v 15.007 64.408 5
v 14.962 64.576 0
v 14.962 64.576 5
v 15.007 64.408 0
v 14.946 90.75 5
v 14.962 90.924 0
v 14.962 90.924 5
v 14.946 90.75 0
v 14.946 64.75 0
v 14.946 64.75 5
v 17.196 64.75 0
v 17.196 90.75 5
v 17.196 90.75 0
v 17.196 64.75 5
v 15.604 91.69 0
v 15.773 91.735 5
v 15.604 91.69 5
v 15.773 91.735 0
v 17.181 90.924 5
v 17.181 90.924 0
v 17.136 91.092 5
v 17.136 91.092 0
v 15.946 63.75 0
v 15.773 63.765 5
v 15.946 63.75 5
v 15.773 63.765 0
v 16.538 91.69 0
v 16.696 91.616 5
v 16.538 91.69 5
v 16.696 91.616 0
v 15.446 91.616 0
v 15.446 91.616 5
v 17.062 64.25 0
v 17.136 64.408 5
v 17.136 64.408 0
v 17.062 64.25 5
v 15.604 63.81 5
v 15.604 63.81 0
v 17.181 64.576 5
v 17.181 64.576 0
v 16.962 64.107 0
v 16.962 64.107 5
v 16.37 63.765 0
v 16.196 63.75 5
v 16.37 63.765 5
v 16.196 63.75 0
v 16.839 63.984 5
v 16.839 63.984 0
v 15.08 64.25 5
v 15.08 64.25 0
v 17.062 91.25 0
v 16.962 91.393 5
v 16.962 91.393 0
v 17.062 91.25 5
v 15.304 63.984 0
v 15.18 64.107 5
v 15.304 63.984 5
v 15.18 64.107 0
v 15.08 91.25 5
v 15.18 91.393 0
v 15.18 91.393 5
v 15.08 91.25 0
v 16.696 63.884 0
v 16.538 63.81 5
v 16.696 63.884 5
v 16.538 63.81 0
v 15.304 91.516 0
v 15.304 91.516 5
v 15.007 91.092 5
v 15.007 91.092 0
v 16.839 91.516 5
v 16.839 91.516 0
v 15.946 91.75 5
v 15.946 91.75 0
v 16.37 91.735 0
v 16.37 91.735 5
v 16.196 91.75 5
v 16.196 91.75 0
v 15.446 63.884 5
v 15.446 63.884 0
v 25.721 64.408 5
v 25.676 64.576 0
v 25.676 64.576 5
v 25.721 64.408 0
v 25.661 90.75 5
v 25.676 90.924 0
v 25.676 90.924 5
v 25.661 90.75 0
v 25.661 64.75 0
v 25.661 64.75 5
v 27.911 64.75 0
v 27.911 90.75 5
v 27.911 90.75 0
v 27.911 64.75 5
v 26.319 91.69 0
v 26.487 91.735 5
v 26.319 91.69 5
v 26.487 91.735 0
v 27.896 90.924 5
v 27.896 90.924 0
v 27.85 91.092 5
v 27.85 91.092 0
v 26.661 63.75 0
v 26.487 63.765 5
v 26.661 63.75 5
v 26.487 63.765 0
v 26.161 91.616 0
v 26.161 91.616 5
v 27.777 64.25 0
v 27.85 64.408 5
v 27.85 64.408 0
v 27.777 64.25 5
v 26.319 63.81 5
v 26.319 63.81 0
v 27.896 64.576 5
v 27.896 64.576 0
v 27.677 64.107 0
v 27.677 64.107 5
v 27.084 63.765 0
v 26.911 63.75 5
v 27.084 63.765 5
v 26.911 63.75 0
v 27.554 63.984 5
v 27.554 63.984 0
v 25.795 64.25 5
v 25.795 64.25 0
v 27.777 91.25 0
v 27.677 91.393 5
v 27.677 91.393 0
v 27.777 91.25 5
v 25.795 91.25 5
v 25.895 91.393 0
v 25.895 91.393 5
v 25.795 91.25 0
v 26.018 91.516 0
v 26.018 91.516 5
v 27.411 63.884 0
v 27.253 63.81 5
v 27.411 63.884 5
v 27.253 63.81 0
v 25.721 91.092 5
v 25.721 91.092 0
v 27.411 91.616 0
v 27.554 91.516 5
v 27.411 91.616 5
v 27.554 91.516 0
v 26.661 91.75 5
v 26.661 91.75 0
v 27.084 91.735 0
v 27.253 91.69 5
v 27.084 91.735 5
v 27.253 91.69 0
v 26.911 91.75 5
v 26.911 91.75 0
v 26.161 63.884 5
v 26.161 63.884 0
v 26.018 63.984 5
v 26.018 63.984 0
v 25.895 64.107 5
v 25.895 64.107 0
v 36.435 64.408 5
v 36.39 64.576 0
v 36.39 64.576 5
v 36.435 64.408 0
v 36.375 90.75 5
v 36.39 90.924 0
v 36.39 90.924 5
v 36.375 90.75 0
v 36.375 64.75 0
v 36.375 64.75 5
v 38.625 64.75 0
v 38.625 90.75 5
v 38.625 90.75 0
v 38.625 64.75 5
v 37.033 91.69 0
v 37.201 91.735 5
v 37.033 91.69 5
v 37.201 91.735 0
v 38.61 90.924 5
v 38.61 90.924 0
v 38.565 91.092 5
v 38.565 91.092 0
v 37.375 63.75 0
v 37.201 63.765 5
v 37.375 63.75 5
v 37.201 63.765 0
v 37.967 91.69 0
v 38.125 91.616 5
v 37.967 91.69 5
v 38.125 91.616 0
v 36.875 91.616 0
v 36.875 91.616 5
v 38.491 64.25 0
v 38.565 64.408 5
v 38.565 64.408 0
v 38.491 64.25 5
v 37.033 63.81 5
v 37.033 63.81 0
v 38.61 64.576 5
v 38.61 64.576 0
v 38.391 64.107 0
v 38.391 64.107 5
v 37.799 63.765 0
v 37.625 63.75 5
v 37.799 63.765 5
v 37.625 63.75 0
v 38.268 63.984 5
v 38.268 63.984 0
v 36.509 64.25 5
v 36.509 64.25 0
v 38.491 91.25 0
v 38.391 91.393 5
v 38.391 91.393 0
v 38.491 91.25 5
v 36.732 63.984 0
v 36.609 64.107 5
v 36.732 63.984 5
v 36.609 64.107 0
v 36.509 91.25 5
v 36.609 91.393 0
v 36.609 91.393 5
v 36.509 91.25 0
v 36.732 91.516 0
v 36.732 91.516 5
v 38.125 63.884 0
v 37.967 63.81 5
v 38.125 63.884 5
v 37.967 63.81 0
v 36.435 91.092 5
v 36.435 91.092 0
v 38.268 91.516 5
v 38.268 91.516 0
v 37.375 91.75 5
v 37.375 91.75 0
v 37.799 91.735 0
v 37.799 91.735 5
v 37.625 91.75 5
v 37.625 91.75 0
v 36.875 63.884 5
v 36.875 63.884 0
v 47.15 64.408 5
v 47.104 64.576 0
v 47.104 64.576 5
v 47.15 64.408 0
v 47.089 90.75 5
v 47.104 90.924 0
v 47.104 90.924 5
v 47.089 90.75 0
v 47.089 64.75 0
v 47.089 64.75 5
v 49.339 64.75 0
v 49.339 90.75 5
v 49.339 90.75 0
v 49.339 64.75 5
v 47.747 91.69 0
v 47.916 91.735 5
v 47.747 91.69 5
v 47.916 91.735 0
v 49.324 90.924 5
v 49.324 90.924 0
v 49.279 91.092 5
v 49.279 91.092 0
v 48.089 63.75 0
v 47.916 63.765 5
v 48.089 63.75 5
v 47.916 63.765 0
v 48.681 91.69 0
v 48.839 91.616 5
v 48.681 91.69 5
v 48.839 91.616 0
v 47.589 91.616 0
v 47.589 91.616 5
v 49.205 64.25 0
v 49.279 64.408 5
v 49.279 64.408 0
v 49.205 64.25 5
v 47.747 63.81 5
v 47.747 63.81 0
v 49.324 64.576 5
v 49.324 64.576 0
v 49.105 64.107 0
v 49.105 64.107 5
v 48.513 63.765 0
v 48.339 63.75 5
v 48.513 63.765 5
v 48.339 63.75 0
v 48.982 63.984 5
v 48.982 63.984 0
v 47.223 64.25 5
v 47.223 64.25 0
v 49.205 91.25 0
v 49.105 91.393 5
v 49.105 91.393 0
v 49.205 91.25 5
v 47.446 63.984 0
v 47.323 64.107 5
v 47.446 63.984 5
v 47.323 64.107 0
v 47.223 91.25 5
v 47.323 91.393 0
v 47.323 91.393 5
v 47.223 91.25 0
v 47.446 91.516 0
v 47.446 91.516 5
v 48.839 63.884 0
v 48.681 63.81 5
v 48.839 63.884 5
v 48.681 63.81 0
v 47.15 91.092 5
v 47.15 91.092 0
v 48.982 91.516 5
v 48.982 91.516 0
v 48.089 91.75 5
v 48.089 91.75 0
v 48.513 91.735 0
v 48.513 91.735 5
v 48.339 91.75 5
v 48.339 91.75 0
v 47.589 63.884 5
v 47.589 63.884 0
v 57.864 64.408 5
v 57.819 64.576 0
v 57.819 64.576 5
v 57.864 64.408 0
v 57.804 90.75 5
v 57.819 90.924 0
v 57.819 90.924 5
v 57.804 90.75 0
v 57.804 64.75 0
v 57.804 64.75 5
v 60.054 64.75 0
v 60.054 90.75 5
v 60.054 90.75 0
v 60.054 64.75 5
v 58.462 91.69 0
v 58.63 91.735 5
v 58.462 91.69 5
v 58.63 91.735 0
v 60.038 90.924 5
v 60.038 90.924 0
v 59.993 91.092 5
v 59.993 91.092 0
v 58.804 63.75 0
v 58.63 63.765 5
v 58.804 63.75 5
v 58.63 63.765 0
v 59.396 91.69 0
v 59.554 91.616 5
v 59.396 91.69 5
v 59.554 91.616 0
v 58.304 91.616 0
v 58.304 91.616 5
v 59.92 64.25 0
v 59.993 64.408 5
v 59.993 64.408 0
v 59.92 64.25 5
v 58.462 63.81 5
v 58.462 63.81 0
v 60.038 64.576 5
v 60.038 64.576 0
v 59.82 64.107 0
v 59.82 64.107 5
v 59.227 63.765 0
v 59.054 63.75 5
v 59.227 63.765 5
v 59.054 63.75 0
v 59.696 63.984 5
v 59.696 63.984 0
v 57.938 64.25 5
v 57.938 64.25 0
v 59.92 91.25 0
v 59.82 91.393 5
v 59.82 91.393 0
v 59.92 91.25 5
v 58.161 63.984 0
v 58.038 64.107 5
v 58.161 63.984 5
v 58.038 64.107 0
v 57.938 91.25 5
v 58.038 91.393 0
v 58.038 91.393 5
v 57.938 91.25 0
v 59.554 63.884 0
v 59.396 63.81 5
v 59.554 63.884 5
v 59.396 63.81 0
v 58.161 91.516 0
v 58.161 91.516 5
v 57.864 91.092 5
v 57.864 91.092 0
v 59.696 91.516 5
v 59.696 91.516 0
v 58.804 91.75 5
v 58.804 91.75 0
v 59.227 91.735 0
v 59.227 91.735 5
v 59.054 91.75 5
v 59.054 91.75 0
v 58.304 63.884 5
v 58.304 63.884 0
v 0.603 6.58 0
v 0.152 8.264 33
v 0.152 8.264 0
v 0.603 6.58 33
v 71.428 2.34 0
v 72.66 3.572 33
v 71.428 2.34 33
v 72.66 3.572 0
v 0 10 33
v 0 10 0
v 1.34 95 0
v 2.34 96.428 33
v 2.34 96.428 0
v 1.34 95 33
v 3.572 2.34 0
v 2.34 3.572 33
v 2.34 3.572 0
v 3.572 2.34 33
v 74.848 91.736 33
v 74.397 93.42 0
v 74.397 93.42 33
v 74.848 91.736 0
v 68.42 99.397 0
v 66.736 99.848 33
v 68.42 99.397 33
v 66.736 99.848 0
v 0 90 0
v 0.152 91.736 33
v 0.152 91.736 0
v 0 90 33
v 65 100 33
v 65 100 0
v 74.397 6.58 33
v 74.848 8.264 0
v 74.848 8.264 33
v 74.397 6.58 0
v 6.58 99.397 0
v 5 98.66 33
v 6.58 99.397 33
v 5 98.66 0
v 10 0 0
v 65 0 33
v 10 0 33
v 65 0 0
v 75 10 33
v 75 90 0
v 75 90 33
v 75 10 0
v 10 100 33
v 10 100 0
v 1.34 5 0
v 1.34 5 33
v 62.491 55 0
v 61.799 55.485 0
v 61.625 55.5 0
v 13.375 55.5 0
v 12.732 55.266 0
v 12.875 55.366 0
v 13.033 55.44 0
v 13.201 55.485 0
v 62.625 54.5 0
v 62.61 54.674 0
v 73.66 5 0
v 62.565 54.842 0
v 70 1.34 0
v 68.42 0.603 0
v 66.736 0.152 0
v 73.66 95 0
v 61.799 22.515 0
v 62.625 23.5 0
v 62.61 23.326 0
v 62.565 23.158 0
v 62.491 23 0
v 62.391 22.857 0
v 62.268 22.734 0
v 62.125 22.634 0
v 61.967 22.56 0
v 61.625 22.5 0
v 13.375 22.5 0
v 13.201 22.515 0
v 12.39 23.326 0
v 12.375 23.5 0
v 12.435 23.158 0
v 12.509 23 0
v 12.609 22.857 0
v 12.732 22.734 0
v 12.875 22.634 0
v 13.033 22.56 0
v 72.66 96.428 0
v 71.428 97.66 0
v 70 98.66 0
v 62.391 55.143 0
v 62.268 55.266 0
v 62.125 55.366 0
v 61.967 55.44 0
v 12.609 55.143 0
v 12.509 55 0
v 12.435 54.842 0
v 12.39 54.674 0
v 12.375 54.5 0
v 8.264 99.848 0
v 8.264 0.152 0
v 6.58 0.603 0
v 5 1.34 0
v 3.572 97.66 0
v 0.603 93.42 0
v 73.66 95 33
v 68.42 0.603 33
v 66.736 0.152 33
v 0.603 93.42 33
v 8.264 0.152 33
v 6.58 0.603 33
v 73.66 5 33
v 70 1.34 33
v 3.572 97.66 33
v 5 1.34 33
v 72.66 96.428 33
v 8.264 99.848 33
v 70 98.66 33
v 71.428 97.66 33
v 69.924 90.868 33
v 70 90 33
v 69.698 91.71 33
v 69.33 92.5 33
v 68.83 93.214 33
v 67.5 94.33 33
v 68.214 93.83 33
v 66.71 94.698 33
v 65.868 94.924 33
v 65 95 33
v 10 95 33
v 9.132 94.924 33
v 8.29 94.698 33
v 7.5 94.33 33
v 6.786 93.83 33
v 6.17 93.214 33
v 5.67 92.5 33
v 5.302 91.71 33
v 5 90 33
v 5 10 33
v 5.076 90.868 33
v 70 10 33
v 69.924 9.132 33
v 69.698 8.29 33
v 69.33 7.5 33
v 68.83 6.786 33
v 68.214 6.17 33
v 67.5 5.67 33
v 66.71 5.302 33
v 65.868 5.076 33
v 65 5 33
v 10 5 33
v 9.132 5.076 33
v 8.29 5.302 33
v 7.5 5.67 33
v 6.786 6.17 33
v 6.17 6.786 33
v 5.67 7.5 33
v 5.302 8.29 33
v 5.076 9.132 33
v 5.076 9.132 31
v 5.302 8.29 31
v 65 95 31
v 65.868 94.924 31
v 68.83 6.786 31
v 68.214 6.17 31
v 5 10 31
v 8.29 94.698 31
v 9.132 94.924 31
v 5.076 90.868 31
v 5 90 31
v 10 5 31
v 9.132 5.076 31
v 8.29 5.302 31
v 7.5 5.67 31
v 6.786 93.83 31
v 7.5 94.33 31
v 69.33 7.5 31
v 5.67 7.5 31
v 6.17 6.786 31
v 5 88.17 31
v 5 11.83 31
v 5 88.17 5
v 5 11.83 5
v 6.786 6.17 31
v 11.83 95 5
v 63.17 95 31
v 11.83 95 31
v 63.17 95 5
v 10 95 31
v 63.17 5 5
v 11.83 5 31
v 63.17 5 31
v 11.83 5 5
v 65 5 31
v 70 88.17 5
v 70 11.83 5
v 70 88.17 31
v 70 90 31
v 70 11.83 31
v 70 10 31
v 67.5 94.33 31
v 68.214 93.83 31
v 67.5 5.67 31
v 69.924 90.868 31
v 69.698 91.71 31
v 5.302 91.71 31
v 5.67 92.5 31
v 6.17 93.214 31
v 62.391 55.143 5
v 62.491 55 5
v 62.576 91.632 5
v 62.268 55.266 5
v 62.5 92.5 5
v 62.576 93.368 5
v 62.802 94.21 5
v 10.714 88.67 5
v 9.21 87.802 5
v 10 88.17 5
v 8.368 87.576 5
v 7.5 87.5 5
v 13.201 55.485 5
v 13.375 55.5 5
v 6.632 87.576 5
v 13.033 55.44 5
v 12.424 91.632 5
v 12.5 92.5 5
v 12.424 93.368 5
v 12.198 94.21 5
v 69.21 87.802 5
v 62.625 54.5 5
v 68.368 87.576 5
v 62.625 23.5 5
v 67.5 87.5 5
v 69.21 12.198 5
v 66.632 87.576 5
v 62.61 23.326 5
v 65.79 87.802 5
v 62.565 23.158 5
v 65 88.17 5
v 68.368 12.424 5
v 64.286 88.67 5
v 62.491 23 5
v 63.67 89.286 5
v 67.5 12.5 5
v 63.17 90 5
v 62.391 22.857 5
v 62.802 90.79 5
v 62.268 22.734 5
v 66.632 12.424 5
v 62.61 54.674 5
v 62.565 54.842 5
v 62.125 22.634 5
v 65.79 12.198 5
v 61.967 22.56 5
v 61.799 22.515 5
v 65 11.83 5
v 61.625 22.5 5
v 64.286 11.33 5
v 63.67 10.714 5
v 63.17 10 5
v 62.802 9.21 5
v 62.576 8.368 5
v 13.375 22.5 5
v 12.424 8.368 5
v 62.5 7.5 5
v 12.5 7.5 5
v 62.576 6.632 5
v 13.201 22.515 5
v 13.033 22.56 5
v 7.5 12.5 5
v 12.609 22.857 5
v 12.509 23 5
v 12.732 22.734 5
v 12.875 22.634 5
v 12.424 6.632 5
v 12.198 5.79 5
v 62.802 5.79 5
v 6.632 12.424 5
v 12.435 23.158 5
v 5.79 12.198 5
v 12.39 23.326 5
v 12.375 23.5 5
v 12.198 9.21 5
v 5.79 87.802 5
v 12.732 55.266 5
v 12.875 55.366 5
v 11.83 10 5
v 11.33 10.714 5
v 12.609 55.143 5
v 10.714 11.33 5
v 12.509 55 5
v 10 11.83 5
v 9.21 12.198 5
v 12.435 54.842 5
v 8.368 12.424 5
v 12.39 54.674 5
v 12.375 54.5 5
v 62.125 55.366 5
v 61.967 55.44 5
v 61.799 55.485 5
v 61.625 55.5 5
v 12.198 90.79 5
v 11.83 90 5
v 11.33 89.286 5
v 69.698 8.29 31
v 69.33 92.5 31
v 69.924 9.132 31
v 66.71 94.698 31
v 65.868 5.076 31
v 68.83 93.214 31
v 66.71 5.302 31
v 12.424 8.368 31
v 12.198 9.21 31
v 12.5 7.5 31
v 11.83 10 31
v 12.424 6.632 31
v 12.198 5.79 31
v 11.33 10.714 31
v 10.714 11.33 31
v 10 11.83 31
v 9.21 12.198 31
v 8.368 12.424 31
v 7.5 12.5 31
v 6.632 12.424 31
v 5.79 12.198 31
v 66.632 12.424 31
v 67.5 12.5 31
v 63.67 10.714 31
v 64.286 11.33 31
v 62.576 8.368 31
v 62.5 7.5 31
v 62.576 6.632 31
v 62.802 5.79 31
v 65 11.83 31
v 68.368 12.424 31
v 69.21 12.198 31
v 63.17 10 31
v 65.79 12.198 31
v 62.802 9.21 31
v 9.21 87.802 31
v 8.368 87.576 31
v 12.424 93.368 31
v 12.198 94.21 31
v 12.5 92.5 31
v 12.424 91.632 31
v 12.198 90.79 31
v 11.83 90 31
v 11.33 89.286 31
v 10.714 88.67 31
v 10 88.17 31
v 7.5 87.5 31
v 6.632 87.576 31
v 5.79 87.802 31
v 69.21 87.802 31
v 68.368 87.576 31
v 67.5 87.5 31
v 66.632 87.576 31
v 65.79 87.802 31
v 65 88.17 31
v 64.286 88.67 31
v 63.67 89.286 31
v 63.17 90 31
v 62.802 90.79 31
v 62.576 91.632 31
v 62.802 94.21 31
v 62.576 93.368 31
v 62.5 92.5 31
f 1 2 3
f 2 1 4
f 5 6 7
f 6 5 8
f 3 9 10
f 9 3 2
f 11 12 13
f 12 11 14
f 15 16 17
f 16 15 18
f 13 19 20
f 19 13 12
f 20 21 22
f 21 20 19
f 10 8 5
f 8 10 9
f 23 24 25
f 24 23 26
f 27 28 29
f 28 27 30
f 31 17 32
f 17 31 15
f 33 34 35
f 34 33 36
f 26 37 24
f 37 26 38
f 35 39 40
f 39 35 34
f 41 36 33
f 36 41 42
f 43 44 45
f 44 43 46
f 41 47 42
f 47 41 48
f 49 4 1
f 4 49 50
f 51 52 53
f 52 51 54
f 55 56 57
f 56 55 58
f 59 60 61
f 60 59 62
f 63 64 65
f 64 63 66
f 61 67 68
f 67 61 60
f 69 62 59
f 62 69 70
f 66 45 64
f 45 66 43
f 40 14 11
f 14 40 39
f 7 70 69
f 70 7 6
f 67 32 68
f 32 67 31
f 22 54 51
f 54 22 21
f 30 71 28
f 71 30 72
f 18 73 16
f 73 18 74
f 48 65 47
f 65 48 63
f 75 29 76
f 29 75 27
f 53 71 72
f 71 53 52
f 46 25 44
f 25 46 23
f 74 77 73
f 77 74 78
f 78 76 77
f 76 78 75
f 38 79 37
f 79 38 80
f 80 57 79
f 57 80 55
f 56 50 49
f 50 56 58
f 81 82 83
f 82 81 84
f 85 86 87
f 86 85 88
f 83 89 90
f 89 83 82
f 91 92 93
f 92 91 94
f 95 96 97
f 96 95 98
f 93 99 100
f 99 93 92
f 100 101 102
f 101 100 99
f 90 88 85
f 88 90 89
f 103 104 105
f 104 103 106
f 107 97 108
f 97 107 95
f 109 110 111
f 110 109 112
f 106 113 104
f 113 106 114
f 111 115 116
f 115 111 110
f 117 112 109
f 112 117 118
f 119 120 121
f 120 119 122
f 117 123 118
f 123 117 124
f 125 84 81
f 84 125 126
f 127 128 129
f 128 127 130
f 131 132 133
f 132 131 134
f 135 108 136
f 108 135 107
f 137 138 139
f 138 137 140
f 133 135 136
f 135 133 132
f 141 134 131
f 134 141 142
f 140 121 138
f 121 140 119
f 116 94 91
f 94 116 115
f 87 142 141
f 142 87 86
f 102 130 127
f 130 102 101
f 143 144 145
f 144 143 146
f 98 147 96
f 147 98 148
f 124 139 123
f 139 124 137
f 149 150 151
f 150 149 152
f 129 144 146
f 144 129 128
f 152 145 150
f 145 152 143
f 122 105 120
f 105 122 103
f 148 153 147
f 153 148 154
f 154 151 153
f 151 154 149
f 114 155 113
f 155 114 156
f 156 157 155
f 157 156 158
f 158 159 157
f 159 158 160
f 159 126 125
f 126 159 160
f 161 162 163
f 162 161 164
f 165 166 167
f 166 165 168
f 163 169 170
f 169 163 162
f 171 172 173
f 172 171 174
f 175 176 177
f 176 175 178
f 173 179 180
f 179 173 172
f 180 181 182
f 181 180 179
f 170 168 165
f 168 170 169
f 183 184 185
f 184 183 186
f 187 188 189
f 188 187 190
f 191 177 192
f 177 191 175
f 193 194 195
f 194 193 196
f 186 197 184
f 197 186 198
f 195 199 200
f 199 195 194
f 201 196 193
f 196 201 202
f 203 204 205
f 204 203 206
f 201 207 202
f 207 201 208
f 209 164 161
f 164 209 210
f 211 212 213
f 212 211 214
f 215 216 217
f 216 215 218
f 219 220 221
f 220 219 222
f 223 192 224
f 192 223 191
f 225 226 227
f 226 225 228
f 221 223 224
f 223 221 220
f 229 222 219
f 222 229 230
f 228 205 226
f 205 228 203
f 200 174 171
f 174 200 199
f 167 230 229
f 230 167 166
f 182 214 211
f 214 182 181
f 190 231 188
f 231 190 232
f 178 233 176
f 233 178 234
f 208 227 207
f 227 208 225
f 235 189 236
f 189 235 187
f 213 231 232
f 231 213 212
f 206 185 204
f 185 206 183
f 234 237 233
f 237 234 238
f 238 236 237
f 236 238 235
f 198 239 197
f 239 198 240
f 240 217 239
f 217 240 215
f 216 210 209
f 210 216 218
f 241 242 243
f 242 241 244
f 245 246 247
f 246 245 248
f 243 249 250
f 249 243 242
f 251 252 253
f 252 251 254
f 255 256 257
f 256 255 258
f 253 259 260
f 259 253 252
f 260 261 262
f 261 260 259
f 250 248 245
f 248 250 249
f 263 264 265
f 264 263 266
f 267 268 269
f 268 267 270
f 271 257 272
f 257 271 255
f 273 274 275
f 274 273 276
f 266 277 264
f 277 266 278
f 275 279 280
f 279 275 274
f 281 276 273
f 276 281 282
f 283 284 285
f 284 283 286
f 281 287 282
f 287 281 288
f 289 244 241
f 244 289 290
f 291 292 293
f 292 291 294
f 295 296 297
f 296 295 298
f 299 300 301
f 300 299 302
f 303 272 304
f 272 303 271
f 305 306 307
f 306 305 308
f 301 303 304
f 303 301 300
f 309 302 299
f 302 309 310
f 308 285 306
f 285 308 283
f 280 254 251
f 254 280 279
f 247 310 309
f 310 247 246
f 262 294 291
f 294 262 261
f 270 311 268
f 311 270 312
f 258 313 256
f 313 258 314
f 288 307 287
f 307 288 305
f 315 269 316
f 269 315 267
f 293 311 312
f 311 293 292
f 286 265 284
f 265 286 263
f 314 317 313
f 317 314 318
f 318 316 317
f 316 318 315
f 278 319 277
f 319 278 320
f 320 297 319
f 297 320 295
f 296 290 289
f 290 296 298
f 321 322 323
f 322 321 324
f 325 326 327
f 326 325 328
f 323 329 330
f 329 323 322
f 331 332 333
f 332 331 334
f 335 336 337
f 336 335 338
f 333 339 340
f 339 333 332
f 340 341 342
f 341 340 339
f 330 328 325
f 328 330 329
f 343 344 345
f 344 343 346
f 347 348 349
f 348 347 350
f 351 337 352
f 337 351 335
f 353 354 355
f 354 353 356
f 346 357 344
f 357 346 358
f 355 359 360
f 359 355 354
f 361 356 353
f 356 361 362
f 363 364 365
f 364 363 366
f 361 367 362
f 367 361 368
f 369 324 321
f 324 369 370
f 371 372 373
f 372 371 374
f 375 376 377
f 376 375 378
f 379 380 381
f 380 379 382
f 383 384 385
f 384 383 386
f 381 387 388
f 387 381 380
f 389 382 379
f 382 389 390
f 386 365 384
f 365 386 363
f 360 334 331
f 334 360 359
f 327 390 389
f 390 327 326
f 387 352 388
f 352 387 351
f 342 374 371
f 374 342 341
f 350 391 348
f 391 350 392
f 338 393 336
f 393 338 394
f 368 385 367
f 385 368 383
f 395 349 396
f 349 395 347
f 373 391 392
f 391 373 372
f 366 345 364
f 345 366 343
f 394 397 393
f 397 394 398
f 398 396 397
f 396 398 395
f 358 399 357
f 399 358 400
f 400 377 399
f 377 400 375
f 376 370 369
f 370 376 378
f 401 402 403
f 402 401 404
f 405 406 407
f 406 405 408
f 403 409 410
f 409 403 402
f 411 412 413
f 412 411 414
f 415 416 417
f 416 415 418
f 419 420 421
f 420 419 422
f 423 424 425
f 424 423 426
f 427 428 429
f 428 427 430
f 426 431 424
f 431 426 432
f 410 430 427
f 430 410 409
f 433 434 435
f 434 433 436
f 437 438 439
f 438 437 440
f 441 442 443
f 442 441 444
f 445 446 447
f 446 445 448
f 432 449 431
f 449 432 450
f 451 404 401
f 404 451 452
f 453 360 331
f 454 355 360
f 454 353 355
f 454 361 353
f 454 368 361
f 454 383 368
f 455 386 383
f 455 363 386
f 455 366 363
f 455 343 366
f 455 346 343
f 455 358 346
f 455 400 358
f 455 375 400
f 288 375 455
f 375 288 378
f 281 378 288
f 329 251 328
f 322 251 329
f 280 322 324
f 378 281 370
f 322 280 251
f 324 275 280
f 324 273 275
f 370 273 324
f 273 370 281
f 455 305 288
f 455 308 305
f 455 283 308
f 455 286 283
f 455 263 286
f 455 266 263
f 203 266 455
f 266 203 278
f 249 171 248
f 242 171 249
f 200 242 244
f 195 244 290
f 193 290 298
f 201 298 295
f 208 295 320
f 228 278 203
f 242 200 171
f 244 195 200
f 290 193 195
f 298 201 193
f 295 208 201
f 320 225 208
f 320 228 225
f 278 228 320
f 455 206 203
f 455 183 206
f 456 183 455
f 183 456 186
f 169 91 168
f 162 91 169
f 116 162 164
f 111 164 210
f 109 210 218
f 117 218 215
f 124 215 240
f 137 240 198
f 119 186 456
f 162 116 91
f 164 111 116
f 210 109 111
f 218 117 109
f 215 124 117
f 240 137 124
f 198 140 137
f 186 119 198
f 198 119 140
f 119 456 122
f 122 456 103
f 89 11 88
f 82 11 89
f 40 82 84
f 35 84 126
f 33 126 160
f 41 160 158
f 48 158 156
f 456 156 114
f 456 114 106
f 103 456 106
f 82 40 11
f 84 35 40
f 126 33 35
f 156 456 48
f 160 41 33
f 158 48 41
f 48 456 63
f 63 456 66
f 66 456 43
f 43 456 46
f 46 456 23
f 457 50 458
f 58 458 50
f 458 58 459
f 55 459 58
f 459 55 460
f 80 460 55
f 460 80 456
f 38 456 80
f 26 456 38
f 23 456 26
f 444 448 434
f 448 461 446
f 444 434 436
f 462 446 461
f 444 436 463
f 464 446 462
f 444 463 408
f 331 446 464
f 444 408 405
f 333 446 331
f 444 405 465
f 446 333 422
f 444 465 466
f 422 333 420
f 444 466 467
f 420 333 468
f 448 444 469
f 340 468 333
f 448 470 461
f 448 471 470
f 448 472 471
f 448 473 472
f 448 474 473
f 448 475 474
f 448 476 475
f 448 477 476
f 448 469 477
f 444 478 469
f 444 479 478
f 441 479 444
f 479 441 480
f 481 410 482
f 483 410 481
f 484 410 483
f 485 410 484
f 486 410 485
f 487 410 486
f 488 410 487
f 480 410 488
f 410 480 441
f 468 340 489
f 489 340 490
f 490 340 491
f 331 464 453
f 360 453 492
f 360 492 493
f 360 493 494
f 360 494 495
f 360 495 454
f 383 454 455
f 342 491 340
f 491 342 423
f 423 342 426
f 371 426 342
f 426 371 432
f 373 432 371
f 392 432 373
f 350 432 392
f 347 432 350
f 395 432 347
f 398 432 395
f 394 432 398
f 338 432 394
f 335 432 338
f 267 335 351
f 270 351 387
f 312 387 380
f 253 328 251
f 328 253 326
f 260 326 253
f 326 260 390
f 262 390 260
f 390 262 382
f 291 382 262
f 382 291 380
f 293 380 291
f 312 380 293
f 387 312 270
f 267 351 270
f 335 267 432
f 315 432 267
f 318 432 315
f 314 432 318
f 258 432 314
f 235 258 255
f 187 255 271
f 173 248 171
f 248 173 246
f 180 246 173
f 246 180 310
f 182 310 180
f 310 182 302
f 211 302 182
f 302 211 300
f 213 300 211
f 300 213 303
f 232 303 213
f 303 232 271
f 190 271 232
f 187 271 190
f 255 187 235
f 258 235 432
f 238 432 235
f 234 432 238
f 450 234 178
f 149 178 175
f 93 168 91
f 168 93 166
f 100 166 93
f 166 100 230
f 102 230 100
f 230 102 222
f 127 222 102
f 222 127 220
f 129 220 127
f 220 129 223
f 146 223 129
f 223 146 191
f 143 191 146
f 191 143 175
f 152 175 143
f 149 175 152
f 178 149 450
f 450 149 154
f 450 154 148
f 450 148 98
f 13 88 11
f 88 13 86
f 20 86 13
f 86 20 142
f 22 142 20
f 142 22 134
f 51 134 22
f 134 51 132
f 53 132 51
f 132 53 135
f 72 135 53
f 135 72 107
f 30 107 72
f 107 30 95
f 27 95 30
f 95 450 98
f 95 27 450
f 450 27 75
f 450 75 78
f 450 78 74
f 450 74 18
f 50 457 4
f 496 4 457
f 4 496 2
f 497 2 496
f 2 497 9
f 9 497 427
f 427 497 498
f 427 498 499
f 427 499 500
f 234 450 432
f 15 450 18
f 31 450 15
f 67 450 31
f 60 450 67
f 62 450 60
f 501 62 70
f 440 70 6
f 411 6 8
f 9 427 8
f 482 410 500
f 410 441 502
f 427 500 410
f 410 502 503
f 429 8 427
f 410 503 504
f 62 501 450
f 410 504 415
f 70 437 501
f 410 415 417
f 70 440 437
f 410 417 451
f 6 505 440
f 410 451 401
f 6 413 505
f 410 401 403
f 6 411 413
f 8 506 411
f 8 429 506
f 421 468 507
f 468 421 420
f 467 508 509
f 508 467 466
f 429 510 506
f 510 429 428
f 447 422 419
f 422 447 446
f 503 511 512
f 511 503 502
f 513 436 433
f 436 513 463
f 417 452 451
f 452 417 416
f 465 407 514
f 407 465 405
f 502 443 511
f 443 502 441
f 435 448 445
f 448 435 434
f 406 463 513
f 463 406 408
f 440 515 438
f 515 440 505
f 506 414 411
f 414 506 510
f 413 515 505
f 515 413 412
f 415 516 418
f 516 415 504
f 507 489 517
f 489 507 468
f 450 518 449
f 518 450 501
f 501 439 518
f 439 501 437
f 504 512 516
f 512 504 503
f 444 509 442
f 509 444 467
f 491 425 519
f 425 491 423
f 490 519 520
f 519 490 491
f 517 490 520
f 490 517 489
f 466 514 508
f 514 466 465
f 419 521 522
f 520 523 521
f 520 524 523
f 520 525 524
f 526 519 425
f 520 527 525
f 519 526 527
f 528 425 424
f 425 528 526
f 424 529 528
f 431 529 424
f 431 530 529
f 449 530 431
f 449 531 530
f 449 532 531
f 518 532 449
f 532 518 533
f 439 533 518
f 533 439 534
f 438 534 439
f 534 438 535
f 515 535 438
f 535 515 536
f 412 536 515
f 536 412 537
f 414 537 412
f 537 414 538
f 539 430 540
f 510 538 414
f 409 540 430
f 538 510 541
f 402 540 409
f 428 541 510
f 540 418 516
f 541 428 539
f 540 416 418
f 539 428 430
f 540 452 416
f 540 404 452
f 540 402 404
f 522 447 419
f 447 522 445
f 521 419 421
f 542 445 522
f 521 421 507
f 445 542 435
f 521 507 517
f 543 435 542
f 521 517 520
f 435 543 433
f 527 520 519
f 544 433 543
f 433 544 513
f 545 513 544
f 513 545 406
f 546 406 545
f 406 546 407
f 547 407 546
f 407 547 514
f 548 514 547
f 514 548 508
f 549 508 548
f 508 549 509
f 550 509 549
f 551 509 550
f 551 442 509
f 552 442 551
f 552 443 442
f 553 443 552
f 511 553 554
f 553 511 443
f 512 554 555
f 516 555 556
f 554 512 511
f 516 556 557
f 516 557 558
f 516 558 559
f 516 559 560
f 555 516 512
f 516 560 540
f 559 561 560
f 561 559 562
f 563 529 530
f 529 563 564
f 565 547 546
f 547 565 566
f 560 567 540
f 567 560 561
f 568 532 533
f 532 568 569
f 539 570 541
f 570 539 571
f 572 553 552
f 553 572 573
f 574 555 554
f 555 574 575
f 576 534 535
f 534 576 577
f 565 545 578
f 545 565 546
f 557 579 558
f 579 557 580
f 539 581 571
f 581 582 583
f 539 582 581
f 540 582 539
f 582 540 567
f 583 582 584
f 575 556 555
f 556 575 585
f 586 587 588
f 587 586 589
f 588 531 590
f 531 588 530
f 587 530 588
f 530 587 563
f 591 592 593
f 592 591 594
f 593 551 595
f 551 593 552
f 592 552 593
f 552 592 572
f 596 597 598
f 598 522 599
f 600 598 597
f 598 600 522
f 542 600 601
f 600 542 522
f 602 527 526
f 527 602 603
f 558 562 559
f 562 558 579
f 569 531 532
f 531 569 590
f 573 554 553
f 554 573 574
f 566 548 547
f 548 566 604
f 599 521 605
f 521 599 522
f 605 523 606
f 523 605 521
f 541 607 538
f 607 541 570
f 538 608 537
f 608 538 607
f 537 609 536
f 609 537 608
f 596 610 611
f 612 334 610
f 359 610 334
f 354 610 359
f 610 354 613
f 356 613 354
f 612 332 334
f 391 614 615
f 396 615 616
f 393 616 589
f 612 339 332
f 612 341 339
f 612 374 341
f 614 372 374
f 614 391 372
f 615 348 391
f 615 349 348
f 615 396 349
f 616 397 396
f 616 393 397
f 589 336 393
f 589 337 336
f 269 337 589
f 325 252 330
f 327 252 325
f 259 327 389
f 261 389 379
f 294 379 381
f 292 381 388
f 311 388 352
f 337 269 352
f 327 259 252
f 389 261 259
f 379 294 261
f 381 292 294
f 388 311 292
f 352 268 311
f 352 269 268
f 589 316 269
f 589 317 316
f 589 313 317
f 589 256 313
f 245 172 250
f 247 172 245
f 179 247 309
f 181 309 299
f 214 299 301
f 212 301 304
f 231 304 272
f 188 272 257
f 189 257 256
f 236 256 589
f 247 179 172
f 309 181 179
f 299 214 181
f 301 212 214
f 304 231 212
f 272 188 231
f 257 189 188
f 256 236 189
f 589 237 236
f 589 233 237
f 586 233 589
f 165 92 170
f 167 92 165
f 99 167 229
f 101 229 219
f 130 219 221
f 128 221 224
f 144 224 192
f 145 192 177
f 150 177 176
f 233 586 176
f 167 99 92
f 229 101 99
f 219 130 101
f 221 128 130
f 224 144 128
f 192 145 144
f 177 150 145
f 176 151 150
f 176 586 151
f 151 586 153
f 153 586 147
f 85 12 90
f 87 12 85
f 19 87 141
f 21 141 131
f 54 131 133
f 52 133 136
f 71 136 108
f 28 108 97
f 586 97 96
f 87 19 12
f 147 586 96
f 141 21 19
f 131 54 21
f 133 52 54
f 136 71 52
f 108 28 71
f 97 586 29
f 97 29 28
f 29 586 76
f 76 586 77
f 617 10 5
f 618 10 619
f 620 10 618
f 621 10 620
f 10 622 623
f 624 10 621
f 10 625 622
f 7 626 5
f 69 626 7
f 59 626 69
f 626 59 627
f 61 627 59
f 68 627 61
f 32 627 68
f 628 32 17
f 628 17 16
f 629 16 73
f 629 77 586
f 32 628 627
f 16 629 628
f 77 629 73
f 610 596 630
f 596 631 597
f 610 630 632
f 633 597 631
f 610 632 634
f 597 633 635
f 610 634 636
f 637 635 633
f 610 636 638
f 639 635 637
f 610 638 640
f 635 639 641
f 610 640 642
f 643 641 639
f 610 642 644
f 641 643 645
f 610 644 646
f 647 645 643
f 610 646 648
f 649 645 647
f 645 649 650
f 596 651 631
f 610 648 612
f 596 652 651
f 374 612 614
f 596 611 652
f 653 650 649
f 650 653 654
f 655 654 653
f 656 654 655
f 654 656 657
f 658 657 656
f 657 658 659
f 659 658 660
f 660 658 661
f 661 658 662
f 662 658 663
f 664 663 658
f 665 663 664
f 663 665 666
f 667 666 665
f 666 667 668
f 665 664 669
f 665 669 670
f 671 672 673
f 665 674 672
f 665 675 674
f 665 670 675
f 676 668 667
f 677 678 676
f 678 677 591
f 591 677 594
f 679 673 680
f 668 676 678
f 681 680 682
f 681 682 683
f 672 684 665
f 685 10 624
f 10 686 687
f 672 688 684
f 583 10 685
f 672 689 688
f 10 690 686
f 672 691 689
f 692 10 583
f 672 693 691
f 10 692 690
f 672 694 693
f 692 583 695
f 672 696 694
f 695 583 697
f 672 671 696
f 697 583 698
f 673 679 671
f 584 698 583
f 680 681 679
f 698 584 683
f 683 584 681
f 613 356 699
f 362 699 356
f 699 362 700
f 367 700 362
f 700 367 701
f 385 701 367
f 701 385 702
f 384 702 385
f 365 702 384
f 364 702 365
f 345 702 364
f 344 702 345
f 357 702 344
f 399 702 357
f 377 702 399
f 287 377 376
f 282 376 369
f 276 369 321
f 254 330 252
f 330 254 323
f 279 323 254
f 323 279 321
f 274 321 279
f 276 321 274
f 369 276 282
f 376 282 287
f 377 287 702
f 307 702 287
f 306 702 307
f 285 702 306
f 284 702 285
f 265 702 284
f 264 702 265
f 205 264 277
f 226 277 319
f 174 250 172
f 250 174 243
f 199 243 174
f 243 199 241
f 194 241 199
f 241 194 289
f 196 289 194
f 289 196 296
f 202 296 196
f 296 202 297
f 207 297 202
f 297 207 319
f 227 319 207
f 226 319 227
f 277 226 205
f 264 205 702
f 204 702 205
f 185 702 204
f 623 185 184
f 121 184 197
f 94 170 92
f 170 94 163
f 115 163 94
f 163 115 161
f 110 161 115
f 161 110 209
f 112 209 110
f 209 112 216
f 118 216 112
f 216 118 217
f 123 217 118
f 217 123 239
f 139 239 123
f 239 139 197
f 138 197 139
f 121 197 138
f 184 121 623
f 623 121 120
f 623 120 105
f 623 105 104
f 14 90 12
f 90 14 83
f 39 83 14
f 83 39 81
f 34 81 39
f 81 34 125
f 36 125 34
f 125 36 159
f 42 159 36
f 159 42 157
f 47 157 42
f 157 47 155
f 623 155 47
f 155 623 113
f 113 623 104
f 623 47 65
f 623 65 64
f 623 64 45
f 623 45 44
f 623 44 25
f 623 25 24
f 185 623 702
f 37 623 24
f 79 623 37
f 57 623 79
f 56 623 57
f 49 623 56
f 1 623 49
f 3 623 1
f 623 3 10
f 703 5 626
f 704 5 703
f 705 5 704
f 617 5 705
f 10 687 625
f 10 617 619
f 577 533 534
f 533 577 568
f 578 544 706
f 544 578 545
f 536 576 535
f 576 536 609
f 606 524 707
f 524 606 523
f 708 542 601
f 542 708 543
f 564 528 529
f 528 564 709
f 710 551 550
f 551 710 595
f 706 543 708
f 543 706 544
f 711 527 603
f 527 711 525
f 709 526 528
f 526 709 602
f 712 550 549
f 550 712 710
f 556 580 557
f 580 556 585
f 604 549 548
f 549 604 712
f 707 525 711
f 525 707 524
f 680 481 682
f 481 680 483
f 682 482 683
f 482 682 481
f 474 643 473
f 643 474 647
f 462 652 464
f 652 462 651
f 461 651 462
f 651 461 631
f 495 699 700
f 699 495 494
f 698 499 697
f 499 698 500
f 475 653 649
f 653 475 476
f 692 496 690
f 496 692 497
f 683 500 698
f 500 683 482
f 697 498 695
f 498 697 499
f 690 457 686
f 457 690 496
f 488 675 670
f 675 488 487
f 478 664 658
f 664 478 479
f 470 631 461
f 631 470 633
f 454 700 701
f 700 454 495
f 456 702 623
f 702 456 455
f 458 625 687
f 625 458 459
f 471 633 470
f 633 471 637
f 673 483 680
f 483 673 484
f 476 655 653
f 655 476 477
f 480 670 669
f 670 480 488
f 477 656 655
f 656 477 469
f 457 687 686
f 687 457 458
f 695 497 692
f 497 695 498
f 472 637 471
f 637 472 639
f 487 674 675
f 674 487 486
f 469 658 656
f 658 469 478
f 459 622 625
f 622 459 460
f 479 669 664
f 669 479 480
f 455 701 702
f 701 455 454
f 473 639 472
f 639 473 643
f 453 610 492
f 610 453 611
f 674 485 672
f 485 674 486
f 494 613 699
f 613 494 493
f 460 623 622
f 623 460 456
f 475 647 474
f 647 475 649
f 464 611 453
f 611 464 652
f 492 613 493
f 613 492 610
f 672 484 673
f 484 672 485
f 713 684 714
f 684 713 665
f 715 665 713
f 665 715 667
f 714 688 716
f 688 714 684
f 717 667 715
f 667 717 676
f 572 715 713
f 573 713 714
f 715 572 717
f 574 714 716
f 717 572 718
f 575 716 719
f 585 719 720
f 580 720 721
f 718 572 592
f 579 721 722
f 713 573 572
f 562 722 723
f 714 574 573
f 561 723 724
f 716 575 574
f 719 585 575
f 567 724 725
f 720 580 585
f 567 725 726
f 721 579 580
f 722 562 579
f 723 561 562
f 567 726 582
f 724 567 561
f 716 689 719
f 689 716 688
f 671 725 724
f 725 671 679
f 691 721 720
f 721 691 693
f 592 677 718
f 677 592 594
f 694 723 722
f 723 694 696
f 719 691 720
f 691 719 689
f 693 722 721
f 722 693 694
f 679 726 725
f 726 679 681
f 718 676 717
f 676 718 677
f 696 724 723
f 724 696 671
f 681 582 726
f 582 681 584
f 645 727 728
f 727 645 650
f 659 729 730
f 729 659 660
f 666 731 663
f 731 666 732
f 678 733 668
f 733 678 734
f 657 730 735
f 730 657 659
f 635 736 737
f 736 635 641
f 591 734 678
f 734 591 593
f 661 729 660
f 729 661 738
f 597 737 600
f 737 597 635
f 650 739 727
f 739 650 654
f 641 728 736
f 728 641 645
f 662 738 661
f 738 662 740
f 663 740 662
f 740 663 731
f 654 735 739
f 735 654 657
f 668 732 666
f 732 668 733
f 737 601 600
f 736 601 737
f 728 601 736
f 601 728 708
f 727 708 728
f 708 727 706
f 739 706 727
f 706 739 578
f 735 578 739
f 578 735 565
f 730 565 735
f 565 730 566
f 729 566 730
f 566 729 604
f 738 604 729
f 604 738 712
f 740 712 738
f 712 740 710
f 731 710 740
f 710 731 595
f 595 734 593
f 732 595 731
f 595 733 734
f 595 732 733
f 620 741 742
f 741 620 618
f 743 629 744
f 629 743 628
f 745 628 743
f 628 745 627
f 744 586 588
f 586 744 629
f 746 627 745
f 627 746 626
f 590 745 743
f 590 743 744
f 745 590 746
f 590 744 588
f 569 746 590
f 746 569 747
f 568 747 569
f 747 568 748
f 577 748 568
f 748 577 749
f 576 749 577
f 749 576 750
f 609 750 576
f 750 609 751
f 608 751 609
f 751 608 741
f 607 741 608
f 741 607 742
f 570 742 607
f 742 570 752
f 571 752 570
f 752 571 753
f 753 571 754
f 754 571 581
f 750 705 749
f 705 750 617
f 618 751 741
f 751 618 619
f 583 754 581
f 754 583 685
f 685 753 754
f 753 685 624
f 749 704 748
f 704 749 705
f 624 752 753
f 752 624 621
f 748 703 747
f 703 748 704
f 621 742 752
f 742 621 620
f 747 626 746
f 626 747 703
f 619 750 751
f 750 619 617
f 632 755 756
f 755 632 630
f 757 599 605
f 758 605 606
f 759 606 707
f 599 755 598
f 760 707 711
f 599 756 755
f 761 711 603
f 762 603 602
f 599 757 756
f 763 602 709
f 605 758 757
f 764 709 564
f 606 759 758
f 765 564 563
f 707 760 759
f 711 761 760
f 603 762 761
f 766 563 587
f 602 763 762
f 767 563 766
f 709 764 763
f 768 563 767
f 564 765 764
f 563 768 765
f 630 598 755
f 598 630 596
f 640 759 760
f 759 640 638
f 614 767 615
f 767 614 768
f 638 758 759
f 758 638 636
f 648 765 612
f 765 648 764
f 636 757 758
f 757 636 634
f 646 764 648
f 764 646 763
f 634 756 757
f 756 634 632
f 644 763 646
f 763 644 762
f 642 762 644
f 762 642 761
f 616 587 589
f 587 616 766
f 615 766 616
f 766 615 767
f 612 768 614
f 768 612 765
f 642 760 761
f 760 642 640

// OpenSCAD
/*
ArduBMO / Back
Version: 0.01
TODO:
*/

$fn=36;

outerX = 75;
outerY = 100;
outerZ = 33;
outerR = 10;
wall = 5;

/* MODULES */

module roundedBox(x,y,z,r){
	translate([r,r,0]){
		linear_extrude(height=z){
			hull(){
				circle(r);
				translate([x-(2*r), 0, 0]) circle(r);
				translate([0, y-(2*r), 0]) circle(r);
				translate([x-(2*r), y-(2*r), 0]) circle(r);
			}
		}
	}
}

module backVents(){
	for (i = [0:4]){
		translate([outerX/7*i,0,-1]) roundedBox(0.03*outerX, 0.28*outerY, 2+wall, 0.1*outerR);
	}
}

module batteryHatch(){
	roundedBox(0.67*outerX, 0.33*outerY, 2+wall, 0.1*outerR);
}

module frontSupports(){
	translate([0.75*outerR, 0.75*outerR, 1]) cylinder(outerZ-3, outerR/2, outerR/2);
	translate([outerX-(0.75*outerR), 0.75*outerR, 1]) cylinder(outerZ-3, outerR/2, outerR/2);
	translate([0.75*outerR, outerY-(0.75*outerR), 1]) cylinder(outerZ-3, outerR/2, outerR/2);
	translate([outerX-(0.75*outerR), outerY-(0.75*outerR), 1]) cylinder(outerZ-3, outerR/2, outerR/2);
}

/* CASE BACK */

union(){
	difference(){
		/* solid block */
		roundedBox(outerX,outerY,outerZ,outerR);
	
		/* hollow */
		translate([wall,wall,wall]){ 
			roundedBox(outerX-(2*wall),outerY-(2*wall),outerZ,outerR-wall);
		}
	
		/* remove back vents */
		translate([(outerX - (4*(outerX/7)+(0.03*outerX)))/2, 0.85*outerX,0]){
			backVents();
		}
		
		/* remove battery hatch */ 
		translate([(outerX-(0.67*outerX))/2, 0.3*outerX, -1]){
			batteryHatch();
		}
	}

	/* Add front fastening supports */
	frontSupports();

	
}
